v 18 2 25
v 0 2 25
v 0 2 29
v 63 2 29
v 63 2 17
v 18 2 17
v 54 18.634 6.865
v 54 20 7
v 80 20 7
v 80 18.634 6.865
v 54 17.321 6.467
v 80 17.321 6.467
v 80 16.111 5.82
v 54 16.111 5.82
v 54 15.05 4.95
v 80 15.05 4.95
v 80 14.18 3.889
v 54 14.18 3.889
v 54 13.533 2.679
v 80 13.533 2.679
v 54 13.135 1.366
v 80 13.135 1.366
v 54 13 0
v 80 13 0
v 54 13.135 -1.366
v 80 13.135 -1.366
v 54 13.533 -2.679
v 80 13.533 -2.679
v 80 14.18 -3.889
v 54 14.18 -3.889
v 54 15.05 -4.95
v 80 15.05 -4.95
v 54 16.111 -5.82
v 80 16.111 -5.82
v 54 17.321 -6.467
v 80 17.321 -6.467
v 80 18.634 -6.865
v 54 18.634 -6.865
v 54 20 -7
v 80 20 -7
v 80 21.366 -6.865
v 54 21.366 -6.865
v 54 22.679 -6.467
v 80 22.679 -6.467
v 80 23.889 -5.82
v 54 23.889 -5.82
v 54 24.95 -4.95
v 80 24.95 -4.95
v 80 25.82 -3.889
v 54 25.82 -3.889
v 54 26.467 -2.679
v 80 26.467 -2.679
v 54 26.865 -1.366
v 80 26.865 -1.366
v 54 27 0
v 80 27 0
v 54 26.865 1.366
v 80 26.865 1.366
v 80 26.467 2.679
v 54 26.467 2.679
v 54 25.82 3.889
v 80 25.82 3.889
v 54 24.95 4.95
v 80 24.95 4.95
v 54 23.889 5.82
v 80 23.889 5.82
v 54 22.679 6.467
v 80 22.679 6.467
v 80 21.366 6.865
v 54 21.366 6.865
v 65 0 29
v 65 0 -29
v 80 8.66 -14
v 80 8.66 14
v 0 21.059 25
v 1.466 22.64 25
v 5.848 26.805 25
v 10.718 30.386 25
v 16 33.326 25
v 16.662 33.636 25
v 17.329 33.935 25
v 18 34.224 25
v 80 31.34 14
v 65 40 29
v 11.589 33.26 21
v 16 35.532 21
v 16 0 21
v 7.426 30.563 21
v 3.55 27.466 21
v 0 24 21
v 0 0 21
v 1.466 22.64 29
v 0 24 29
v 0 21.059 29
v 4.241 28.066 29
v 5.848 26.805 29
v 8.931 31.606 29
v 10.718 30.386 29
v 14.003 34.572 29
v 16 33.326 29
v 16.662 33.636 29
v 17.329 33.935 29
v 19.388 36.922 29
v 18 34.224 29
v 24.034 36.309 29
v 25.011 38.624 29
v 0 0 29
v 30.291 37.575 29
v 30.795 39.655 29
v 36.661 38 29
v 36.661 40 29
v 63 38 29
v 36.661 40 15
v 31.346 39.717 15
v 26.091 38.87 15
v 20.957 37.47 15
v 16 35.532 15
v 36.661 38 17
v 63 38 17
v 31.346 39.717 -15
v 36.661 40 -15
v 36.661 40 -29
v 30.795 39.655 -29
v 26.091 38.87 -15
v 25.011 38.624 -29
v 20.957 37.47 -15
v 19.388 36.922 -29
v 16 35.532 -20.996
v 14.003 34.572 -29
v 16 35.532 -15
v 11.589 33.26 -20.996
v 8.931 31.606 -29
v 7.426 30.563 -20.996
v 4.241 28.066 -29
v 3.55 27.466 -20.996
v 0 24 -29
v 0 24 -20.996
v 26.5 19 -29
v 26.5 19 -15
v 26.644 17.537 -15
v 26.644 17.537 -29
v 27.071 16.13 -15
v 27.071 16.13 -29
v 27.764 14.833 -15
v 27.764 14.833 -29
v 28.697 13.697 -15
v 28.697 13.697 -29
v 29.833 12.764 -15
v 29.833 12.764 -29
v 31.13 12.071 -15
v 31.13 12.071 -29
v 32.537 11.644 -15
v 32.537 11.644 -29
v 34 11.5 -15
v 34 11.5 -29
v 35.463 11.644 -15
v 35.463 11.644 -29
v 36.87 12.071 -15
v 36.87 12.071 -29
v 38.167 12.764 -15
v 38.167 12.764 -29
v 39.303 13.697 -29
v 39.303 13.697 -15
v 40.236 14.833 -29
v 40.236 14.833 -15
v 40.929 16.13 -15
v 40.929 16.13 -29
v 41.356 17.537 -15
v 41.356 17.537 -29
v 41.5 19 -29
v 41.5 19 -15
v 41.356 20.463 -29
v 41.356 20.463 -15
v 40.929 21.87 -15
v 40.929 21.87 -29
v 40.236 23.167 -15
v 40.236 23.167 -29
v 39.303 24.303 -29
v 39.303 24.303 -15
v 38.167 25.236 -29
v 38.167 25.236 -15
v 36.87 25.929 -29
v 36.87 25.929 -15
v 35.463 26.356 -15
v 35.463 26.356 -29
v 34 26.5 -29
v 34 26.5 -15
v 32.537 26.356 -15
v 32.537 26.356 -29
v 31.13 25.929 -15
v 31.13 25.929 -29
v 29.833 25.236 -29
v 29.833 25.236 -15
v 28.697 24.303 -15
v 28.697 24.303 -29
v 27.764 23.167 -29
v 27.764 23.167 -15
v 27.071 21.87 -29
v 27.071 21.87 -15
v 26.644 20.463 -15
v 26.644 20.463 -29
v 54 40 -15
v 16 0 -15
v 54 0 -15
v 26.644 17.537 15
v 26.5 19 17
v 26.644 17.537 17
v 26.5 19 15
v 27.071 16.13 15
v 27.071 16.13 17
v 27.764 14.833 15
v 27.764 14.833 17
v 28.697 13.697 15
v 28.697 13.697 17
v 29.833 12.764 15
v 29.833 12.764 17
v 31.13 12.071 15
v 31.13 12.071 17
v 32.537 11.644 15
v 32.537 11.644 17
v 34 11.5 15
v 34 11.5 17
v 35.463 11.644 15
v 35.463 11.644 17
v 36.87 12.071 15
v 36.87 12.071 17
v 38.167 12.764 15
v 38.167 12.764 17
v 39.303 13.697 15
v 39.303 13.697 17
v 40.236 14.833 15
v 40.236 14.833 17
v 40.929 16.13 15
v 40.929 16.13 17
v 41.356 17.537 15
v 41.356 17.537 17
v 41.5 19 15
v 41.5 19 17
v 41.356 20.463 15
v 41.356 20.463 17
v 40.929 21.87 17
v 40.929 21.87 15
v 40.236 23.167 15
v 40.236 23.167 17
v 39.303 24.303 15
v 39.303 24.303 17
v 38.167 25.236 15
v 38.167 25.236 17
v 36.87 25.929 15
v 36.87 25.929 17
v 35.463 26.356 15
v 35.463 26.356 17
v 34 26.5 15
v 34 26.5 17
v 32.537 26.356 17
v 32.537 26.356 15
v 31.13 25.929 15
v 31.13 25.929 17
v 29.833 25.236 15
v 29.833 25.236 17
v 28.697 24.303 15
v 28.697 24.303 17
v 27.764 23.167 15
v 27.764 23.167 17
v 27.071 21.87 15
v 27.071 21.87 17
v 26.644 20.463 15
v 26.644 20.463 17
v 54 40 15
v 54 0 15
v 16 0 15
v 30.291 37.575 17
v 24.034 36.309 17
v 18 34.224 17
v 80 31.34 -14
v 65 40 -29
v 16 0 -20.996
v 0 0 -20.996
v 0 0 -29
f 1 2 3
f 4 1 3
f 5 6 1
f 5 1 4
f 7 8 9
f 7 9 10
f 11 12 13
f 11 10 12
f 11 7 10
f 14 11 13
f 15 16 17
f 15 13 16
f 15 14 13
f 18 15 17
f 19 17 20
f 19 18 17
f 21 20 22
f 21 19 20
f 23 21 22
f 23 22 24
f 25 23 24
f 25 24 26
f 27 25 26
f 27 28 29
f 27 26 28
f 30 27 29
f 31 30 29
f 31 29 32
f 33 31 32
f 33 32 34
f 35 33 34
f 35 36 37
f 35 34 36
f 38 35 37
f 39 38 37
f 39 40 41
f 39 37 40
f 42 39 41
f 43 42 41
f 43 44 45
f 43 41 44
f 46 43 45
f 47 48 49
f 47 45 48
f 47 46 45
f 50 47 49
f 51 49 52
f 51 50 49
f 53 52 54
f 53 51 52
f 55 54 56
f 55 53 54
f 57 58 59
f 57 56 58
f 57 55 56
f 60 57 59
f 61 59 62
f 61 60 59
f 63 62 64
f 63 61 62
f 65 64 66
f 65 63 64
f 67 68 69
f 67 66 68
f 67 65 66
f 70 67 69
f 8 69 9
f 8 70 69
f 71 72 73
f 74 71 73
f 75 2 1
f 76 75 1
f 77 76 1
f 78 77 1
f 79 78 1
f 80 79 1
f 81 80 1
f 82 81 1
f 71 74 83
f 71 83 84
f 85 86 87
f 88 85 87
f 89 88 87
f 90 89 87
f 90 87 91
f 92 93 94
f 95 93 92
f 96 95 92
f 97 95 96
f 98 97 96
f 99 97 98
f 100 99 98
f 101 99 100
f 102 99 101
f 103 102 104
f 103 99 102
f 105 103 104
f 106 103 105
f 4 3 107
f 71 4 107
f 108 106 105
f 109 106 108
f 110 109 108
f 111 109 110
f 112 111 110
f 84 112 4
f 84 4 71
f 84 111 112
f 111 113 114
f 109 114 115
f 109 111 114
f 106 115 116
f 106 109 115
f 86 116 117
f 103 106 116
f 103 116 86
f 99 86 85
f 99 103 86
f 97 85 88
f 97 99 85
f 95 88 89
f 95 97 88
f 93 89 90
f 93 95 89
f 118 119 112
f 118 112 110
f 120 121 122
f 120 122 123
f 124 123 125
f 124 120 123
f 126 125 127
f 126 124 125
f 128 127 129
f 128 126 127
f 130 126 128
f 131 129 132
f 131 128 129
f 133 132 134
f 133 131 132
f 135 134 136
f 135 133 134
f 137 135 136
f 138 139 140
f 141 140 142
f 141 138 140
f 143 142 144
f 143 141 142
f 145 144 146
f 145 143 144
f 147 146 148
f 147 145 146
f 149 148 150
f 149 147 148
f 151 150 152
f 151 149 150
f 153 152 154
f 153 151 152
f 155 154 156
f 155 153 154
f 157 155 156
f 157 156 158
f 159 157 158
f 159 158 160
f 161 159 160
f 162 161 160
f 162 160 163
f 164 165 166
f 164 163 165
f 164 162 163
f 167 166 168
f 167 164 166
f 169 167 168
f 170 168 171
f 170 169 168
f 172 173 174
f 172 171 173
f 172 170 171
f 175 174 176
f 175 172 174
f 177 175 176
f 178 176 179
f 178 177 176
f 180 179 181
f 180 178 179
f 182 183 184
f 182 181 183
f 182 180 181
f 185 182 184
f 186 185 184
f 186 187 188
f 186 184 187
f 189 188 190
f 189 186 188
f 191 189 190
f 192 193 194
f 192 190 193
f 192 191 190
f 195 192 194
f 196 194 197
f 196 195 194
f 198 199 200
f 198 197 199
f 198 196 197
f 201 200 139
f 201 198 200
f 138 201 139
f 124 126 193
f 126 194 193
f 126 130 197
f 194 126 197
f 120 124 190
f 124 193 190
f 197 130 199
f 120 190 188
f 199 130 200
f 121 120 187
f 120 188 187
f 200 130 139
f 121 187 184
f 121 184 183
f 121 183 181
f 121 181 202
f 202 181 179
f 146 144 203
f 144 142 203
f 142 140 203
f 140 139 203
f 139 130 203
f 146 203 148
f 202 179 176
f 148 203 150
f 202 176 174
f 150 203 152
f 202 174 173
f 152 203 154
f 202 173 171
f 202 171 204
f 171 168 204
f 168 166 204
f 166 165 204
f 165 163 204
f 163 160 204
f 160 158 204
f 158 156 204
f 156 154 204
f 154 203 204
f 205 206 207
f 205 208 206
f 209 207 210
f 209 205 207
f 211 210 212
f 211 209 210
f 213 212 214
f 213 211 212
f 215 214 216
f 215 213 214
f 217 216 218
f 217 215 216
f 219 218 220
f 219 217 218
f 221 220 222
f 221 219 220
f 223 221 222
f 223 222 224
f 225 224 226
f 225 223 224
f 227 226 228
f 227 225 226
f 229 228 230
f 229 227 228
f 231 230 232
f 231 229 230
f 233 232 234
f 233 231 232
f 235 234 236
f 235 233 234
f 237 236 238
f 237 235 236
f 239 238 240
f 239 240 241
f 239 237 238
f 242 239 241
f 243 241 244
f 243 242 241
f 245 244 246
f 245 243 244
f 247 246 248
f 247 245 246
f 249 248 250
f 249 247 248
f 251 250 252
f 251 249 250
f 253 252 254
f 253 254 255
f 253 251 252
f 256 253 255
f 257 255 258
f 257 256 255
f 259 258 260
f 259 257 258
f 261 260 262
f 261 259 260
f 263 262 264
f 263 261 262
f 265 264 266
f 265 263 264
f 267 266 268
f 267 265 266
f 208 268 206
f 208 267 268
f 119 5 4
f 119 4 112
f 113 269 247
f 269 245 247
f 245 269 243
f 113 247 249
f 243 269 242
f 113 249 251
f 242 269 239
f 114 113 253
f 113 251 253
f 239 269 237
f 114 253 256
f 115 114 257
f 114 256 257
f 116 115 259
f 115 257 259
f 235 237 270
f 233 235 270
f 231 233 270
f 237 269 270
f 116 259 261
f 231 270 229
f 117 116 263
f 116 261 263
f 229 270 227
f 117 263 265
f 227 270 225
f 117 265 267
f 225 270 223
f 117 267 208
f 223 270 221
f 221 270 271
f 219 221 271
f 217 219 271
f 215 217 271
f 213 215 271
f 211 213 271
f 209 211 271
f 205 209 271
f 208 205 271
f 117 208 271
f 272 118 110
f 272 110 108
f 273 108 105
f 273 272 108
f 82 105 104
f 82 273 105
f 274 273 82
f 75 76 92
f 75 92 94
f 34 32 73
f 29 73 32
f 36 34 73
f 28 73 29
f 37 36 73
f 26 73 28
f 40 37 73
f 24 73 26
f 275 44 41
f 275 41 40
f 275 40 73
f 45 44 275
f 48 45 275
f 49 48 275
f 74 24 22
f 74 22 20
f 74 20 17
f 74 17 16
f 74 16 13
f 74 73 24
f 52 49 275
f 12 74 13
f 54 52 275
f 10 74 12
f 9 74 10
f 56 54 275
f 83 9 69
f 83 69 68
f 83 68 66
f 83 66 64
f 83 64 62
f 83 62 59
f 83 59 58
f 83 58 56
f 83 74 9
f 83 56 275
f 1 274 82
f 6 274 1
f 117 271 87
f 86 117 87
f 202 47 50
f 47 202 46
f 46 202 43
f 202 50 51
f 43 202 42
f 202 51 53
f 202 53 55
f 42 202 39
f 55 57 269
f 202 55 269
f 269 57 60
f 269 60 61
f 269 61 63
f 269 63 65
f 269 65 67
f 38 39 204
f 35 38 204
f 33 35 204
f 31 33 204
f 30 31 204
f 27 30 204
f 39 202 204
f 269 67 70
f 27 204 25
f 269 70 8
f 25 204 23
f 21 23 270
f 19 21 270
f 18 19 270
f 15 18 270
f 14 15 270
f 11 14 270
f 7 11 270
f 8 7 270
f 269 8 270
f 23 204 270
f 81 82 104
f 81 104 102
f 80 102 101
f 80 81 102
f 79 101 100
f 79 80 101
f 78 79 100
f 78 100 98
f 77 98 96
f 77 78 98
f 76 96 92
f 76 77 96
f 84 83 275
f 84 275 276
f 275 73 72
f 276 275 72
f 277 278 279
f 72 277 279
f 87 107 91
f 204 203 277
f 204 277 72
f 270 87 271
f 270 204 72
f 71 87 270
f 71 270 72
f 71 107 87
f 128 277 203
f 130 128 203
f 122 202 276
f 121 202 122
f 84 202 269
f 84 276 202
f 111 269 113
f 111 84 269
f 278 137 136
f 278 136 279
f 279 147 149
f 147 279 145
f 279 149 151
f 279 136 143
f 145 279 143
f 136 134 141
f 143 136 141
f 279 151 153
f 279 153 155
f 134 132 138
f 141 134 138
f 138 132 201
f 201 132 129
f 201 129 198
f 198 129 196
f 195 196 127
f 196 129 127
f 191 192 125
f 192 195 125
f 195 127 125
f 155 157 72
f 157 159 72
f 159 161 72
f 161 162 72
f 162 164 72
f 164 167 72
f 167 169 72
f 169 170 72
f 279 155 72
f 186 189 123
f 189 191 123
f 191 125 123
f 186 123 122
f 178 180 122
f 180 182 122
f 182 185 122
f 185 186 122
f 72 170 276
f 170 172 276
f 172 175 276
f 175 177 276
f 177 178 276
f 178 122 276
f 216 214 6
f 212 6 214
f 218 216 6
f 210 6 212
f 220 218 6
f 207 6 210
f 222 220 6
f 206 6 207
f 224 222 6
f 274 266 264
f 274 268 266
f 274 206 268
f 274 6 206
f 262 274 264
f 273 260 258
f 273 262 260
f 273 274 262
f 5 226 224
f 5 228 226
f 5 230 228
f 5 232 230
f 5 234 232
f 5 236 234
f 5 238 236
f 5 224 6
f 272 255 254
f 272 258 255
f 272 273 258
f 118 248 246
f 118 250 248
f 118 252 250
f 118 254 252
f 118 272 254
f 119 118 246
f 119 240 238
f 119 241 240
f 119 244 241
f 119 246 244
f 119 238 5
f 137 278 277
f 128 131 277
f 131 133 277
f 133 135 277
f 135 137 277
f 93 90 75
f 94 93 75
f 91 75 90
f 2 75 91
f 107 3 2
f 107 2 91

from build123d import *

# Parameters (mm, degrees)
SKETCH1_R               = 7.5
BOSS_EXTRUDE1_DEPTH     = 29
CUT_EXTRUDE1_DEPTH      = 65
CUT_EXTRUDE2_DEPTH      = 95.026591983
CUT_EXTRUDE2_DEPTH_BACK = 38
SKETCH4_R               = 7
CUT_EXTRUDE3_DEPTH      = 40
CUT_EXTRUDE6_START      = -12
SKETCH10_R              = 7.5
CUT_EXTRUDE6_DEPTH      = 12
CUT_EXTRUDE7_START      = -4
CUT_EXTRUDE7_DEPTH      = 4


with BuildPart() as part:
    # Sketch1 → Boss-Extrude1 (new, symmetric)
    with BuildSketch(Plane.XY):
        with BuildLine():
            Line((0, 0), (65, 0))
            Line((65, 0), (80, 8.660254038))
            Line((80, 8.660254038), (80, 31.339745962))
            Line((80, 31.339745962), (65, 40))
            Line((65, 40), (36.66060556, 40))
            ThreePointArc((36.66060556, 40), (16.66060556, 35.82575695), (0, 24))
            Line((0, 24), (0, 0))
        make_face()
        with Locations((34, 19)):
            Circle(SKETCH1_R, mode=Mode.SUBTRACT)
    extrude(amount=BOSS_EXTRUDE1_DEPTH, both=True)

    # Sketch2 → Cut-Extrude1 (cut)
    with BuildSketch(Plane(origin=(0, 0, 0), x_dir=(1, 0, 0), z_dir=(0, 1, 0))):
        Polygon((0, 20.995620851), (16, 20.995620851), (16, 15), (54, 15), (54, -15), (16, -15), (16, -21), (0, -21), align=None)
    extrude(amount=CUT_EXTRUDE1_DEPTH, mode=Mode.SUBTRACT)

    # Sketch4 → Cut-Extrude2 (cut, two sides: drawn at the far end of the back side and taken through both)
    with BuildSketch(Plane(origin=(80, 0, 0), x_dir=(0, 0, -1), z_dir=(1, 0, 0)).offset(-CUT_EXTRUDE2_DEPTH_BACK)):
        with Locations((0, 20)):
            Circle(SKETCH4_R)
    extrude(amount=CUT_EXTRUDE2_DEPTH + CUT_EXTRUDE2_DEPTH_BACK, mode=Mode.SUBTRACT)

    # Sketch6 → Cut-Extrude3 (cut)
    with BuildSketch(Plane(origin=(0, 0, 0), x_dir=(1, 0, 0), z_dir=(0, 1, 0))):
        Polygon((65, 29), (80, 29), (80, 14), align=None)
        Polygon((65, -29), (80, -29), (80, -14), align=None)
    extrude(amount=CUT_EXTRUDE3_DEPTH, mode=Mode.SUBTRACT)

    # Sketch10 → Cut-Extrude6 (cut)
    with BuildSketch(Plane.XY.offset(29).offset(CUT_EXTRUDE6_START)):
        with BuildLine():
            Line((18, 34.224221872), (18, 2))
            Line((18, 2), (63, 2))
            Line((63, 2), (63, 38))
            Line((63, 38), (36.66060556, 38))
            ThreePointArc((36.66060556, 38), (27.141221384, 37.046586751), (18, 34.224221872))
        make_face()
        with Locations((34, 19)):
            Circle(SKETCH10_R, mode=Mode.SUBTRACT)
    extrude(amount=CUT_EXTRUDE6_DEPTH, mode=Mode.SUBTRACT)

    # Sketch10<5> → Cut-Extrude7 (cut)
    with BuildSketch(Plane.XY.offset(29).offset(CUT_EXTRUDE7_START)):
        with BuildLine():
            Line((18, 2), (18, 34.224221872))
            ThreePointArc((18, 34.224221872), (9.117311148, 29.311155325), (1.466424222, 22.64))
            Line((1.466424222, 22.64), (0, 21.058823529))
            Line((0, 21.058823529), (0, 2))
            Line((0, 2), (18, 2))
        make_face()
    extrude(amount=CUT_EXTRUDE7_DEPTH, mode=Mode.SUBTRACT)


solid = part.part
